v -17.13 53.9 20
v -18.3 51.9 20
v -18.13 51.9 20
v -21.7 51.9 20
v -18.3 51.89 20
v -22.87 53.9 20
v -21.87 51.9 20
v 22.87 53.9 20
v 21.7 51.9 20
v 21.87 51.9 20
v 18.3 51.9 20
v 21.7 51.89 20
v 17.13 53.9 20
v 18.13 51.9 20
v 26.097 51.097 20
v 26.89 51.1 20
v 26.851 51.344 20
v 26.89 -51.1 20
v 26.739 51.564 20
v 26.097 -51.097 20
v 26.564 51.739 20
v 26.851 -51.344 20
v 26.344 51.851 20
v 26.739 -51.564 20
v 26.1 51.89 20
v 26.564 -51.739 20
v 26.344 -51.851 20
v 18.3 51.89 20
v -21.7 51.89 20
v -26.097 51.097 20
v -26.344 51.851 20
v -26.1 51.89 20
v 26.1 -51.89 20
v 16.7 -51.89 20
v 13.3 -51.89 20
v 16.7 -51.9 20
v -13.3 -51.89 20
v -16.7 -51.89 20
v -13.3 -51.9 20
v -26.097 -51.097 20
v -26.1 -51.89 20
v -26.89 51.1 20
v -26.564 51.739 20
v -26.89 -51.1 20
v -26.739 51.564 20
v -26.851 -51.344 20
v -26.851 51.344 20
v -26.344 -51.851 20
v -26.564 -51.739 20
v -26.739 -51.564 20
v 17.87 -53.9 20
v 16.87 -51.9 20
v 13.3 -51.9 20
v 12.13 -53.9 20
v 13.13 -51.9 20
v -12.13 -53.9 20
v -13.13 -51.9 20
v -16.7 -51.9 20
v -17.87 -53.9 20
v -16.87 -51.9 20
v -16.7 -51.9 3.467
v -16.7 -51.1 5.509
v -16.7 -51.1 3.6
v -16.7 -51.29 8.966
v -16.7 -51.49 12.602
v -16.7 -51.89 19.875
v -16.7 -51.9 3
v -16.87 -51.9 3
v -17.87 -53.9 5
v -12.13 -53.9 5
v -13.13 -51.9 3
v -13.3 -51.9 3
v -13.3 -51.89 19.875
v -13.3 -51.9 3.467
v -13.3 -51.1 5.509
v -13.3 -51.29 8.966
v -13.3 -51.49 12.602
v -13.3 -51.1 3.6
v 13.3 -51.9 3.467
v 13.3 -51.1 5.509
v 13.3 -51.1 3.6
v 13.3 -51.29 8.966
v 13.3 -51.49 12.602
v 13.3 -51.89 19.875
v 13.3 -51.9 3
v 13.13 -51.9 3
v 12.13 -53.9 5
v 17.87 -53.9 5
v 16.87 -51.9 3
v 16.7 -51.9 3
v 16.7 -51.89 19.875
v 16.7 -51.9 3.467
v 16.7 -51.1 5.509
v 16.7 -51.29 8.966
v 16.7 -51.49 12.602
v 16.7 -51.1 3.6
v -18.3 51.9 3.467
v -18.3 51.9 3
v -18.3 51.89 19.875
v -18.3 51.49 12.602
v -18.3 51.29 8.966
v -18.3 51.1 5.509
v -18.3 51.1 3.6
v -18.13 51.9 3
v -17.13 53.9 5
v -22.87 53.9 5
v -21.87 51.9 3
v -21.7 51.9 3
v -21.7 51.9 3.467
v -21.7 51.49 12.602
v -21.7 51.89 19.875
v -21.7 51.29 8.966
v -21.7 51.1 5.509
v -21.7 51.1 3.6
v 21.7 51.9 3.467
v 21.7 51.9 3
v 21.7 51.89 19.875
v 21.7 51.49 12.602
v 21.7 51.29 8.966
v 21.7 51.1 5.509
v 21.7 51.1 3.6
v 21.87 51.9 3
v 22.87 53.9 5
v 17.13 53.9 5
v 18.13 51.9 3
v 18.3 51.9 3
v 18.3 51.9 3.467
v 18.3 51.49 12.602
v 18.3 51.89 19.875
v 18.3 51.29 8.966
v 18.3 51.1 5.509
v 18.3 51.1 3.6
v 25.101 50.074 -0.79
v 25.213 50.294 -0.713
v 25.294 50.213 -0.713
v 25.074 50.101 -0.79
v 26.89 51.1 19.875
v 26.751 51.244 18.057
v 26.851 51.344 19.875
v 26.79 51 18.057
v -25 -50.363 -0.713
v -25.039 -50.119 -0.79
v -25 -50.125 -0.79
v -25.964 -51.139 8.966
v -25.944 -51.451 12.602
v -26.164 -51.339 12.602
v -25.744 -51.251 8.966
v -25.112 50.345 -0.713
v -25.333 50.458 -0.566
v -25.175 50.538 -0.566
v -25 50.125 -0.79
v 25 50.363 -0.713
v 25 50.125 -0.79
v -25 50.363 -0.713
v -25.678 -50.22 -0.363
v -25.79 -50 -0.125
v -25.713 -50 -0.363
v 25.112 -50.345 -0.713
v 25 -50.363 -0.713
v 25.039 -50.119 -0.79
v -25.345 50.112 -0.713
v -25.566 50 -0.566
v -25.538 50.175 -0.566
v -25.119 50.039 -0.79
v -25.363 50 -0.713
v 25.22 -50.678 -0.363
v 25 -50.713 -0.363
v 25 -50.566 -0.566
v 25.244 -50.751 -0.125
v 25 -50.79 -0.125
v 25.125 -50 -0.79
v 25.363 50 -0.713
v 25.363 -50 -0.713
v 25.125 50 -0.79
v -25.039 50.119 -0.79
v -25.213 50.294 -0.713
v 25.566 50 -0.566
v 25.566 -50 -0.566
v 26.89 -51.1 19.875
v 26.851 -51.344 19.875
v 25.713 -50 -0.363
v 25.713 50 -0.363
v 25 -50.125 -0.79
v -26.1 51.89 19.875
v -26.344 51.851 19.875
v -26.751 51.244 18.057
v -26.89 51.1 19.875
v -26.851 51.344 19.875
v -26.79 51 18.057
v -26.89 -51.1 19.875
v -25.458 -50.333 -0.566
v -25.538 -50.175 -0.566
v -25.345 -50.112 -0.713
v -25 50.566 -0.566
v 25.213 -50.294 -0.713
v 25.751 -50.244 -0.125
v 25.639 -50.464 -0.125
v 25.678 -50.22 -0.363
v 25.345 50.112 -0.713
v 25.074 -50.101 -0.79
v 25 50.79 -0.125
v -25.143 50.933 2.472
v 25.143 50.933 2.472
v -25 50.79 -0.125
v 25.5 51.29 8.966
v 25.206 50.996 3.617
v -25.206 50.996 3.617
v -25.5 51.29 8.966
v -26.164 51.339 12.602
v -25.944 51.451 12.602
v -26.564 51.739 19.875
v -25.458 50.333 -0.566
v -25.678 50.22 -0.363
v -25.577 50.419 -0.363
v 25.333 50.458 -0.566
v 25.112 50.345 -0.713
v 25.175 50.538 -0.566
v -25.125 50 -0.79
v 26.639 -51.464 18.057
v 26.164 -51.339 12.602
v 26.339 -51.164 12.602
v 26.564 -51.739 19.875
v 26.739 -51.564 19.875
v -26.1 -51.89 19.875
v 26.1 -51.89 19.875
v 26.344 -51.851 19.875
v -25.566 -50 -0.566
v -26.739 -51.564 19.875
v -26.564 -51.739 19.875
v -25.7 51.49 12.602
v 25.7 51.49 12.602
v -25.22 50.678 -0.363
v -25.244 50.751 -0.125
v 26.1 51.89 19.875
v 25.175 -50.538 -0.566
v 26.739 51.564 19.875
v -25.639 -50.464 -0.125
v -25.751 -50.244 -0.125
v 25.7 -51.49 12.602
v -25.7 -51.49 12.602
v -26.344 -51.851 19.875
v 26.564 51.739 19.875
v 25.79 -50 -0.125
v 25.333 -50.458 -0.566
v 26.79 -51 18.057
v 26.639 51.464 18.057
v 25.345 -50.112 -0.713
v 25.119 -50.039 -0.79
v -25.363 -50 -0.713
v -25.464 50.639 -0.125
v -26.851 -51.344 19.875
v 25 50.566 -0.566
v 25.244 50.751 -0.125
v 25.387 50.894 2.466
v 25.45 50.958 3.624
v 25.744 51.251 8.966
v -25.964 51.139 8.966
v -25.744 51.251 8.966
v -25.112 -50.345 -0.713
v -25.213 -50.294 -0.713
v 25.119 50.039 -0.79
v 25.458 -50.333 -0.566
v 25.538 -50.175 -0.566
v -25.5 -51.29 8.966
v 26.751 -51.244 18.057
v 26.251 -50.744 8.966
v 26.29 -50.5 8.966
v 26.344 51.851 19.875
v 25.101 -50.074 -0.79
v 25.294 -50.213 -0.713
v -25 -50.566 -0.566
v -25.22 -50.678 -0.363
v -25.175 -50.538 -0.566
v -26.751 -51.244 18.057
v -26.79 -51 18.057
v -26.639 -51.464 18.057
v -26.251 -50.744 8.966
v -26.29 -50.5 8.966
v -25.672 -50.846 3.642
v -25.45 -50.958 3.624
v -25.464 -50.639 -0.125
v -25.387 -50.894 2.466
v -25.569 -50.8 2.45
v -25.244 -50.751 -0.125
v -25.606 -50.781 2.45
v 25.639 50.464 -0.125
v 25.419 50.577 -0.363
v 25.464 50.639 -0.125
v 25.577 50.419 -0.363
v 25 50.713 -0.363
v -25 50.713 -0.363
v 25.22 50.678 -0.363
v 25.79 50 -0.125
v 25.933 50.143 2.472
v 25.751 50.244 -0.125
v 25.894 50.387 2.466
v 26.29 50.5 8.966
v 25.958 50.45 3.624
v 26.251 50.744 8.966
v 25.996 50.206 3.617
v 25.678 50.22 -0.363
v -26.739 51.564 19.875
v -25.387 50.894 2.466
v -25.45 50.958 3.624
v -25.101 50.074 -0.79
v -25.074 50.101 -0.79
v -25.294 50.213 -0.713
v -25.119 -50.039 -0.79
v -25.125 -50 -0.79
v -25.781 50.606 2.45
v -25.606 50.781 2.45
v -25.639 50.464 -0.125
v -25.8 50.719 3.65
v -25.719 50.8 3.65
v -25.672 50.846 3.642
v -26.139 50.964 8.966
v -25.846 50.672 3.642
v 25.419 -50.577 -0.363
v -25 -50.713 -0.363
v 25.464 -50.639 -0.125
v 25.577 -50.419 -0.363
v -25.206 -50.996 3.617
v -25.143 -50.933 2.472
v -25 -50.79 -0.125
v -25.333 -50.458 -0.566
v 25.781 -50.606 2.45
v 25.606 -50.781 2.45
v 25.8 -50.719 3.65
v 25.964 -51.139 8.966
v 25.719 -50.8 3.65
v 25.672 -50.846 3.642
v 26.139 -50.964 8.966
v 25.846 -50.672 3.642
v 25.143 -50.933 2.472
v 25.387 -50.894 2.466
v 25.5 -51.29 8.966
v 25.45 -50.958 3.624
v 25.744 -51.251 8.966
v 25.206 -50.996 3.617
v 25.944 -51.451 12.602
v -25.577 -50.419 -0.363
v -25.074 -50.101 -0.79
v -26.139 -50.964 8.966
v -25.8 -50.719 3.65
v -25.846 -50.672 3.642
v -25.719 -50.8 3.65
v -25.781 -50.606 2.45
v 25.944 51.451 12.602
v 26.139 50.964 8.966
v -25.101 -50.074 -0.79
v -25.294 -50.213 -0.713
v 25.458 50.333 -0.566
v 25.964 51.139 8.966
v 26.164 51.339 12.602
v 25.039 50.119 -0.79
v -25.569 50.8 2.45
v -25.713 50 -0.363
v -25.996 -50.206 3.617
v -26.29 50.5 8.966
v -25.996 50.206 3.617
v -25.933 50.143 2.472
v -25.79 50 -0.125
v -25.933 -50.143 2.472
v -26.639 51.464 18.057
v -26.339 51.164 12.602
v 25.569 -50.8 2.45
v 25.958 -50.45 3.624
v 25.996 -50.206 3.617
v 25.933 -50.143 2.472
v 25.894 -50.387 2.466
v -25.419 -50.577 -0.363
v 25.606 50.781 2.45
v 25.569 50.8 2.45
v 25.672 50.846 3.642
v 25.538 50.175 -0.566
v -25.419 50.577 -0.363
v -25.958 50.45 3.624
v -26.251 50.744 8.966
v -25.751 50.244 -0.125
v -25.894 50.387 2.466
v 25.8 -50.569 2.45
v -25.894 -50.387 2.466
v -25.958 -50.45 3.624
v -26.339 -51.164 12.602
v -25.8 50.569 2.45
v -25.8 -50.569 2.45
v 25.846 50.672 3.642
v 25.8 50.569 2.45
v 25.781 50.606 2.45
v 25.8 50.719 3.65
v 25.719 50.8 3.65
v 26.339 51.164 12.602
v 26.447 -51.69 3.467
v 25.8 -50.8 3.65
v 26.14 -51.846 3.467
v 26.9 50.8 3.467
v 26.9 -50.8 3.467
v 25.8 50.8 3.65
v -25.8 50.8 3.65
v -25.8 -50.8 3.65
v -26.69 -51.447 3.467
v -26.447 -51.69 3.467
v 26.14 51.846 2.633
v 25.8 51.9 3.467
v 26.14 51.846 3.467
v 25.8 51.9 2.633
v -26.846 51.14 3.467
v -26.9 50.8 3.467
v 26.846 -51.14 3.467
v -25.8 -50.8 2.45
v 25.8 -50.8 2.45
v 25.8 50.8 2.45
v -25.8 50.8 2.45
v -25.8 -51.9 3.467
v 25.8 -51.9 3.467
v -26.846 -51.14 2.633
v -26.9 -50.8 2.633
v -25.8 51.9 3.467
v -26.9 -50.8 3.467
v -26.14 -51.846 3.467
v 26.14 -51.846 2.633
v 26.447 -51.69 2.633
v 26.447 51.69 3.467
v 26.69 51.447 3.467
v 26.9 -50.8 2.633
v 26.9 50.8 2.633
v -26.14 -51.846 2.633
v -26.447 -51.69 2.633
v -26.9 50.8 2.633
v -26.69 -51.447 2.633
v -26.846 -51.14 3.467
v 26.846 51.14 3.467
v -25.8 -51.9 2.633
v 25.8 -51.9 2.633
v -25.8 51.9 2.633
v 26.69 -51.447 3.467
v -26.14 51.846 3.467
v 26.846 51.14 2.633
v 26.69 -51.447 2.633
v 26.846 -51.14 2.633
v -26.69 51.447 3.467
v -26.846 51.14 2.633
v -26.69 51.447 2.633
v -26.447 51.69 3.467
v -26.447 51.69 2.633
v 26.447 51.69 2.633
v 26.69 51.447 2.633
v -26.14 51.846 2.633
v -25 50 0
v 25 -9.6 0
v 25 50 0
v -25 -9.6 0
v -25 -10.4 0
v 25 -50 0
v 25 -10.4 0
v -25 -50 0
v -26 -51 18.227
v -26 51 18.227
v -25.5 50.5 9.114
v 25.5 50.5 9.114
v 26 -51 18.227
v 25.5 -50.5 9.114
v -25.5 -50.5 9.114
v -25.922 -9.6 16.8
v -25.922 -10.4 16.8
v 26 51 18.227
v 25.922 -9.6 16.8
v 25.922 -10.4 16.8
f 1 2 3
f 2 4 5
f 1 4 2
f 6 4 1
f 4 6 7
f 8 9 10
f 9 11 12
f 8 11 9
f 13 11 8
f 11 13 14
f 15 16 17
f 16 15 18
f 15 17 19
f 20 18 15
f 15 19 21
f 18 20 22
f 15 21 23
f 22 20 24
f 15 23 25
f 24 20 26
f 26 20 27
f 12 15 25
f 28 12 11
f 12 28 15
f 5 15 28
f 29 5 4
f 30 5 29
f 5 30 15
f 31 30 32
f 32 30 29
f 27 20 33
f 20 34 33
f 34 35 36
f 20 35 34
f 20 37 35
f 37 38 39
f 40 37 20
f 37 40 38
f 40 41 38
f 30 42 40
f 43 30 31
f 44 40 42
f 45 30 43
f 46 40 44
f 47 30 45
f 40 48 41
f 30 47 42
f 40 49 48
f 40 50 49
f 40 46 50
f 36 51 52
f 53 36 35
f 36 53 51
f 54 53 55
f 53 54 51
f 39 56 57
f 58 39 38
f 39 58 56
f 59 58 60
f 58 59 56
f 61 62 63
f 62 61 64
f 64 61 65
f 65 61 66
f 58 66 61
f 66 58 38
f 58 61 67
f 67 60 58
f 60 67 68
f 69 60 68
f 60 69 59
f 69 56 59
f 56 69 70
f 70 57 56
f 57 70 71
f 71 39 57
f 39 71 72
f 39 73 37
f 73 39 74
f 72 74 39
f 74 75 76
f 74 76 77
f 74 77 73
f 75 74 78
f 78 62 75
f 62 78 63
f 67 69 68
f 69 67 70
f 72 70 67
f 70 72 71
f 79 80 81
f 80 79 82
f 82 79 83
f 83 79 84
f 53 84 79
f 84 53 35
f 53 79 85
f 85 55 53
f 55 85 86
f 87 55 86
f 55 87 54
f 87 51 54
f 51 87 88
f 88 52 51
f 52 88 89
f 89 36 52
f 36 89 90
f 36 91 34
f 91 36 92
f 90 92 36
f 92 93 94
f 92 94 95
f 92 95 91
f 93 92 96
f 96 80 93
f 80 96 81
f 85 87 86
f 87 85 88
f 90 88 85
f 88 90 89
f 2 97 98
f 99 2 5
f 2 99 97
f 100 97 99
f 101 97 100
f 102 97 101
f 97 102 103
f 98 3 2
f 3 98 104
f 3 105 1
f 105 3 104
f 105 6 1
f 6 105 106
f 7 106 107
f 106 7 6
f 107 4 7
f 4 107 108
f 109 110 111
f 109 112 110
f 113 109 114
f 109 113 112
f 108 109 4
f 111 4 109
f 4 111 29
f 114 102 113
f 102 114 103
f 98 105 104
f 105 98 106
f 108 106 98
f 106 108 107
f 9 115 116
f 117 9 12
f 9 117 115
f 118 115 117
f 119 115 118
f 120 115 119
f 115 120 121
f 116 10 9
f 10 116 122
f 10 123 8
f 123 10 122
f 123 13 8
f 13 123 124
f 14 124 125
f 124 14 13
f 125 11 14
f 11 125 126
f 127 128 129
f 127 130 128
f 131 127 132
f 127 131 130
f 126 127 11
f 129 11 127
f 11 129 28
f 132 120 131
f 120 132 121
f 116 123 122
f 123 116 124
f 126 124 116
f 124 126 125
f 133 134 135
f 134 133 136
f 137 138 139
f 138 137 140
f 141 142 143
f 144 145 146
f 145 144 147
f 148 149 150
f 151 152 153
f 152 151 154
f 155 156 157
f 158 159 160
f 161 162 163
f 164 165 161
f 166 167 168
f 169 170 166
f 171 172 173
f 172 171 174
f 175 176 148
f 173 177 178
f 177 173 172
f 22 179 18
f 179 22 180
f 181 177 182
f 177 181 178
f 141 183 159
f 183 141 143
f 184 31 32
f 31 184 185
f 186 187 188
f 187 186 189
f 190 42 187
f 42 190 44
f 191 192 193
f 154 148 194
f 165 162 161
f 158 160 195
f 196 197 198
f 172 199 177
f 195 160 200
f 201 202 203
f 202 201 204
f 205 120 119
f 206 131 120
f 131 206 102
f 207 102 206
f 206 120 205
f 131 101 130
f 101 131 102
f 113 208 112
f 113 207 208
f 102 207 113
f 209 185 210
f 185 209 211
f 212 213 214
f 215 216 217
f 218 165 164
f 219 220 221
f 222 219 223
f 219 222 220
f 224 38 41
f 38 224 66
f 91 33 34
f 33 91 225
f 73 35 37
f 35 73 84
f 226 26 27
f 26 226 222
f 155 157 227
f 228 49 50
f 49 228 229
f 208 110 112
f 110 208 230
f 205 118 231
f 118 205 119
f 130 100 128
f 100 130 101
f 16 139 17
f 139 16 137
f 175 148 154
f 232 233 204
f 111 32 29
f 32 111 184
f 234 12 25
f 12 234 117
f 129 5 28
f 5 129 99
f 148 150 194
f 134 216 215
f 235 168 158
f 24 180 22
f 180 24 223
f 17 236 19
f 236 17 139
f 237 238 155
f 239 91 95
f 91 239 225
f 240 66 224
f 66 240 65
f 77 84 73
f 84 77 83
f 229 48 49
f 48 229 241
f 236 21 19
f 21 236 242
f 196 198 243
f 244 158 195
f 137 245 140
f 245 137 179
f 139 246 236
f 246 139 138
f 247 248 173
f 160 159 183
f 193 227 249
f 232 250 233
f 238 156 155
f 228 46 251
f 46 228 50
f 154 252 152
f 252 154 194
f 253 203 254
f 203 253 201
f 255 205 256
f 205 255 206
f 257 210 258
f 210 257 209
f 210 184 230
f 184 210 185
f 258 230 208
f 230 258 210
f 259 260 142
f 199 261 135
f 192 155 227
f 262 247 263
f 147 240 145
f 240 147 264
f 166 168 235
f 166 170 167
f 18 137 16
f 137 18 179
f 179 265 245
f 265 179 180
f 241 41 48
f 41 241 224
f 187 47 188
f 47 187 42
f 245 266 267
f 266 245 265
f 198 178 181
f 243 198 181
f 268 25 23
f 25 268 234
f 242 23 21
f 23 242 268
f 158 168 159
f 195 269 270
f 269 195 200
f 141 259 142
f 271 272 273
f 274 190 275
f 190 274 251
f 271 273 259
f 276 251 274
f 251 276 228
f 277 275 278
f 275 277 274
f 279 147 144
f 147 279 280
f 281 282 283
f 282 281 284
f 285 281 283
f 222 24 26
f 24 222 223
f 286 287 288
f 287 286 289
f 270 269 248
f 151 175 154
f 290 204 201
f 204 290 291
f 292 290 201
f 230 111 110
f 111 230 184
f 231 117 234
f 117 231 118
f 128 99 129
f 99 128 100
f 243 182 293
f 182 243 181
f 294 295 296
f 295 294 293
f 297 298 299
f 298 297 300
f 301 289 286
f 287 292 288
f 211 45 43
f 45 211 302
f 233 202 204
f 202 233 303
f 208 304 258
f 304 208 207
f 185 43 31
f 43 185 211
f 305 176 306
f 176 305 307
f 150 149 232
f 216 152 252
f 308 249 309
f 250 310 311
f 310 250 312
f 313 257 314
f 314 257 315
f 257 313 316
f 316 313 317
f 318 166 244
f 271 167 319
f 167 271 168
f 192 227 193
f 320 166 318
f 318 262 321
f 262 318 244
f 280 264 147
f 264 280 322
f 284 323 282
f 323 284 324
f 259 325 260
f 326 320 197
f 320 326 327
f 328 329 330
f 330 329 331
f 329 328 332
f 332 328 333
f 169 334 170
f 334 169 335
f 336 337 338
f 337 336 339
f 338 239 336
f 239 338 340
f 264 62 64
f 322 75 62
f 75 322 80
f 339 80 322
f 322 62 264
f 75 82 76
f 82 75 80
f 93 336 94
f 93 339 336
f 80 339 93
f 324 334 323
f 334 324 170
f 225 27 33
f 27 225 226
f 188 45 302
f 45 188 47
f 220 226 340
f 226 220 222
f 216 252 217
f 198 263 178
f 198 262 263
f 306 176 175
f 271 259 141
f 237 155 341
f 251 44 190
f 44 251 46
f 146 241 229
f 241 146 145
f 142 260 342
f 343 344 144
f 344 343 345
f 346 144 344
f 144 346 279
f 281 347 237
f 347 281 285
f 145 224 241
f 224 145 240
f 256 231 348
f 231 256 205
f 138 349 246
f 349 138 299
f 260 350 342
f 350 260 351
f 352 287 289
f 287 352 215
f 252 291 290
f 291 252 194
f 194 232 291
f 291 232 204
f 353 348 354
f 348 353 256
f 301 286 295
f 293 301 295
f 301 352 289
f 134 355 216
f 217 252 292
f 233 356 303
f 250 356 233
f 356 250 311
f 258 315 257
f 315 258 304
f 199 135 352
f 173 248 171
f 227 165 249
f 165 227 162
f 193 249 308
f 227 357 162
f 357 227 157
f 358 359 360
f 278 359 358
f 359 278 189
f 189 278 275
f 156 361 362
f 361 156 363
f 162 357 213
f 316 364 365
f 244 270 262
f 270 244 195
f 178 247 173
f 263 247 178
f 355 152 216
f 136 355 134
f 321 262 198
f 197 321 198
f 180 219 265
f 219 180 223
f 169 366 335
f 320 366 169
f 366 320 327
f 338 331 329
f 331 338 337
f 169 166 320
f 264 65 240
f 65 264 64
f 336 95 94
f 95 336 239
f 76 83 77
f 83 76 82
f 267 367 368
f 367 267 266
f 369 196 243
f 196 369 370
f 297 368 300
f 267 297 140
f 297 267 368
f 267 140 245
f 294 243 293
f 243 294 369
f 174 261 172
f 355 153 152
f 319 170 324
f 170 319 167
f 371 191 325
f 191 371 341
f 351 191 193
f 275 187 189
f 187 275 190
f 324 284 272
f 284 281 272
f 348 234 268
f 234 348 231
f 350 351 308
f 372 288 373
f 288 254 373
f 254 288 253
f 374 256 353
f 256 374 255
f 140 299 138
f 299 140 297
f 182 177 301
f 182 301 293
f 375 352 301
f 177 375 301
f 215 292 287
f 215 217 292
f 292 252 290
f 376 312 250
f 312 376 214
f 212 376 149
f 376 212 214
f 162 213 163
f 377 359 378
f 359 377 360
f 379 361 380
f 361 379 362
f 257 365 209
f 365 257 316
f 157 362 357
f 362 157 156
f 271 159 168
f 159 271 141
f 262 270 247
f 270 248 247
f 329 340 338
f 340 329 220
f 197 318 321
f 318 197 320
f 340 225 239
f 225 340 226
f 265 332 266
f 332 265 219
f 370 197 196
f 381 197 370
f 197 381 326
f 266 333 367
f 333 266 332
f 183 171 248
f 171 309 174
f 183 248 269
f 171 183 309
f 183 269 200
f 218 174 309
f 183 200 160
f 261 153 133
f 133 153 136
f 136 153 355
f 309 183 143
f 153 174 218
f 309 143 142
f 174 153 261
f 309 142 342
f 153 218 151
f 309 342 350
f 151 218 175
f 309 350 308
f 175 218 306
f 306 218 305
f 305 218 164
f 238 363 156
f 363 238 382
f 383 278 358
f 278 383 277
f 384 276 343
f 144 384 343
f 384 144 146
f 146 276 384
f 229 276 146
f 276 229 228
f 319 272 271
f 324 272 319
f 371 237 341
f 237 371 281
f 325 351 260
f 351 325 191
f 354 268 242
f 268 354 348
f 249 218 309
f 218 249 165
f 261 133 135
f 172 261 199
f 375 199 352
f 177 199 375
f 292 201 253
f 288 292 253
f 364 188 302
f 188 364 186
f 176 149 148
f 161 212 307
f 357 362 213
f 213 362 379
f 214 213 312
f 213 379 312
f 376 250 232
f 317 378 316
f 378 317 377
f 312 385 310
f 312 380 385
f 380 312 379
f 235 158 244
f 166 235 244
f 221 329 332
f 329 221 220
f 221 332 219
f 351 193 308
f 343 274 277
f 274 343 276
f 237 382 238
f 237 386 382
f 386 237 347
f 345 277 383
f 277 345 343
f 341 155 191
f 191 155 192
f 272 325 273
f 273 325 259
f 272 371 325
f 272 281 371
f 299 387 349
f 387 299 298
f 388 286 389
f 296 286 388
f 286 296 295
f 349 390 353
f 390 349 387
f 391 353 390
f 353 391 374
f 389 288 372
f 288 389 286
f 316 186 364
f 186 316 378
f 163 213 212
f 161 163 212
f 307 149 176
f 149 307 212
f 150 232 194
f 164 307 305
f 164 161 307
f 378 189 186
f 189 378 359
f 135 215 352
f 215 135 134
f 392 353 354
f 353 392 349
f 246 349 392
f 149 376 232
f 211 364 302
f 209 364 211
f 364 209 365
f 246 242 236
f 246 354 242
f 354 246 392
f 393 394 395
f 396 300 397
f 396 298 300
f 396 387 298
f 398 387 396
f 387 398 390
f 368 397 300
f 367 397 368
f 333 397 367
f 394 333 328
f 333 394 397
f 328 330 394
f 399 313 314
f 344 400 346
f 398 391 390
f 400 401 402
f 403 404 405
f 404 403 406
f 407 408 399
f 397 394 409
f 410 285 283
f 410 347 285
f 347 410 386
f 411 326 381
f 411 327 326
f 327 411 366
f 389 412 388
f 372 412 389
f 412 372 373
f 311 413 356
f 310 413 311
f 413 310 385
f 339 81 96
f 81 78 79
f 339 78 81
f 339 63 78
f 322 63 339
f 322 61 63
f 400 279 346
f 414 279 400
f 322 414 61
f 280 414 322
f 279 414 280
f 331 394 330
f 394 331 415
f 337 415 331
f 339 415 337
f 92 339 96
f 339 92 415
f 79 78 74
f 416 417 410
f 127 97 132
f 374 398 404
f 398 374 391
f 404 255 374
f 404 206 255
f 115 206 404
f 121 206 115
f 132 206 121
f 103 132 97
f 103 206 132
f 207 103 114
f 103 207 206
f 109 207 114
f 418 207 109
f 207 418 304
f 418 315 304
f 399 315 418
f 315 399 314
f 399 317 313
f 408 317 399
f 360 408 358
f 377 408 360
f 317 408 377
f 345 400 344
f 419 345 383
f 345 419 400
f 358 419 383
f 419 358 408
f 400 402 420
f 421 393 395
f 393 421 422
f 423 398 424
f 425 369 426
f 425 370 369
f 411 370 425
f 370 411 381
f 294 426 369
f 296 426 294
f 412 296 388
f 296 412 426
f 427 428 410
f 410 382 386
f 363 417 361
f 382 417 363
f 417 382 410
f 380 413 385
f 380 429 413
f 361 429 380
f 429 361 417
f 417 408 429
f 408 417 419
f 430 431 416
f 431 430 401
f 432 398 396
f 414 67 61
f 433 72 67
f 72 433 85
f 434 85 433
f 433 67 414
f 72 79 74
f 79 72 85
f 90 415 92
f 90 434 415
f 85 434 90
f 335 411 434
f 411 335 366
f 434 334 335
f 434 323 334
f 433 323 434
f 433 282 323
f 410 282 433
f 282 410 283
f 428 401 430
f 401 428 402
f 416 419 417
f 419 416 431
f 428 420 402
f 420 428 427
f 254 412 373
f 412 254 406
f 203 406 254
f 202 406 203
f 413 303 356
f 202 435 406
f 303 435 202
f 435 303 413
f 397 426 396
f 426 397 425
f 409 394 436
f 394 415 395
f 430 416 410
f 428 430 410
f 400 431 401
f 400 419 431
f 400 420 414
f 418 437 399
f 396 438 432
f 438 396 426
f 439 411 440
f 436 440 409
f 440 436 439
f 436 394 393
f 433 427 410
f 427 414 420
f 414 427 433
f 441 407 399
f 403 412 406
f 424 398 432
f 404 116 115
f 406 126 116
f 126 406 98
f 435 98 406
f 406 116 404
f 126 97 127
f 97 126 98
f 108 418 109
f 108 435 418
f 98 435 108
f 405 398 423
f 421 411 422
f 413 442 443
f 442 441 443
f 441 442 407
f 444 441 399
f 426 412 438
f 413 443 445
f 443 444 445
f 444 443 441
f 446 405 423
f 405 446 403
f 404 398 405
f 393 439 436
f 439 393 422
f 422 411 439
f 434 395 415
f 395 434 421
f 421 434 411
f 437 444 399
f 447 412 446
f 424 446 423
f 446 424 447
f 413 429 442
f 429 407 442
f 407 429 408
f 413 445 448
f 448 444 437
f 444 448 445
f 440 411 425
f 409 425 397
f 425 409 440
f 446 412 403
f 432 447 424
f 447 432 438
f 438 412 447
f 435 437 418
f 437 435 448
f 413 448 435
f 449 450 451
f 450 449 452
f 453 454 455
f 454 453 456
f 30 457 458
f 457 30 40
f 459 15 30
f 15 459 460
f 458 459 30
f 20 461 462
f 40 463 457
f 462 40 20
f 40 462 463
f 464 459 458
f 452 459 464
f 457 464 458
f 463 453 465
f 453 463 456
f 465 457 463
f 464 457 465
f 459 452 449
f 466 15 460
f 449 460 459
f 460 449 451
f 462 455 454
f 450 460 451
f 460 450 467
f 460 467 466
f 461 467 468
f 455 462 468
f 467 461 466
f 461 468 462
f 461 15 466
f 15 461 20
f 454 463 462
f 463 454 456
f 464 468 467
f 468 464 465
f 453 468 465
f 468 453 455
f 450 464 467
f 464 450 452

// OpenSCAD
// some simple but versatile thin-walled storage boxes
//
//
// Background:
//   - CAD manual: http://www.openscad.org/documentation.html
//   - possibility to attach to parts from raspi_RJ45fix.scad
//
// Andreas Merz 2019-01-12, v0.8 
// GPLv3 or later, see http://www.gnu.org/licenses





//-------------------------------
// dovetail
//
//       w2
//    ---------
//    \       /  h
//     ---+---
//       w1
//-------------------------------

module schwalbenschwanz(h=2, w1=4, w2=6) {
             //w1=(w2-h*tan(30));      // Flankenwinkel 30 deg
             c=0.13;   // clearance / spiel in mm
             polygon(points=[[-w1/2+c,0],[w1/2-c,0],[w2/2-c,h],[-w2/2+c,h]]);
}

module dovetail3D(h=20, s=45, t=0.8) {
         c=0.3;   // clearance / spiel in mm
         difference() { 
           linear_extrude(height=h)
              union() {
                schwalbenschwanz();
                translate([-2+c,-t]) square([4-2*c,t]);

              }
           rotate([s,0,0]) translate([-4,0,-4]) cube([8, 4, 4]);
         }
 }


// Werkzeuge, um Fasen mit minkowsky() herzustellen

module pyramid(h=1) {
    linear_extrude(height=h, scale=0) rotate([0,0,45]) square(sqrt(2)*h,center=true);
}

module octaeder(r=1) {
  union() {
    pyramid(h=r);
    rotate([180,0,0]) pyramid(h=r);
  }
}

module halfsphere(r=1) {
  intersection() { 
    sphere(r, $fn=20); 
    translate([-2,-2,0]*r) cube(4*r);
  }
}


module trapezrot(r=1) {
   rotate_extrude($fn=20)
      polygon([[0,r/2],[r,r/3],[r,-r/3],[0,-r/2]]);
}

// add-on to avoid warping
module mouseear4(xm=50, ym=100, hm=0.45) {
  rm=9;
  linear_extrude(height=hm)
    union() {
      translate([0,  0]) circle(r=rm);
      translate([xm, 0]) circle(r=rm);
      translate([0, ym]) circle(r=rm);
      translate([xm,ym]) circle(r=rm);
    }
}


//------------------------
// simple brick-shaped box
//------------------------
module am_boxA(x=50, y=100, z=20) {
  // x,y,z: inner dimensions
  w=0.8;    // wall thickness
  union() {
    difference() {
      minkowski() {        // outer contour, chamfered
        cube([x,y,z]);
        rotate([180,0,0]) pyramid(h=w);
      }
      cube([x,y,z+w]);
    }
  }
}

//------------------------
// stackable box
//------------------------
module am_boxB(x=50, y=100, z=20) {
  // x,y,z: inner dimensions
  w=0.8;         // wall thickness
  c=0.6;         // clearance
  sx=(x+2*w+c)/x;  // slope factor x
  sy=(y+2*w+c)/y;  // slope factor y
  union() {
    difference() {
      union() {
        minkowski() {                    // outer contour, chamfered
          linear_extrude(height=z, scale=[sx,sy]) square([x,y],center=true);
          rotate([180,0,0]) halfsphere(r=w);
        }
        translate([0,0,3])               // stacking rim
          minkowski() { 
            linear_extrude(height=0.1) 
              square([x+2*w,y+2*w],center=true);
            trapezrot(r=w+c/2);
          }
      }
      linear_extrude(height=z+0.05, scale=[sx,sy]) square([x,y],center=true); // inner box
    }
  }
}

//-----------------------------------------------------------
// stackable box with dove tail connection / label holder
//-----------------------------------------------------------
module am_boxC(x=50, y=100, z=20) {
  // x,y,z: inner dimensions
  w=0.8;         // wall thickness
  c=0.6;         // clearance
  sx=(x+2*w+c)/x;  // slope factor x
  sy=(y+2*w+c)/y;  // slope factor y
  union() {
    difference() {
      union() {
        minkowski() {                    // outer contour, chamfered
          linear_extrude(height=z, scale=[sx,sy]) square([x,y],center=true);
          rotate([180,0,0]) halfsphere(r=w);
        }
        translate([0,0,3])               // stacking rim
          minkowski() { 
            linear_extrude(height=0.1) 
              square([x+2*w,y+2*w],center=true);
            trapezrot(r=w+c/2);
          }
        
        // dovetail connector
        translate([-2*10+5,-(y/2+2*w+c/2),3]) rotate(180) dovetail3D(h=z-3);
        translate([+2*10-5,-(y/2+2*w+c/2),3]) rotate(180) dovetail3D(h=z-3);
        translate([-2*10+0, (y/2+2*w+c/2),3]) rotate(  0) dovetail3D(h=z-3);
        translate([+2*10-0, (y/2+2*w+c/2),3]) rotate(  0) dovetail3D(h=z-3);
      }
      linear_extrude(height=z+0.05, scale=[sx,sy]) square([x,y],center=true); // inner box
    }
  }
}

//---------------------------------
// box with separator wall 
//---------------------------------
module am_boxWall(x=50, y=40, z=20) {
  w=0.8;         // wall thickness
  c=0.6;         // clearance
  t=3.2;         // clearance on top of wall
  sx=(x+2*w*(z-t)/z+c)/x;  // slope factor x
         linear_extrude(height=z-t,scale=[sx,1]) 
           square([x+w,w],center=true);
}

module am_boxD(x=50, y=100, z=20) {
  yratio=0.6;  // size ratio of separation
  union() {
    am_boxC(x=x, y=y, z=z);
    translate([0,y*(0.5 - yratio),0]) am_boxWall(x=x, y=y, z=z);
  }
}


//---------------------------------
// label to fit between dovetail 
//---------------------------------
// for symbols, consider png23d
//
module am_boxlabelA( txt="1", lx=25, ly=15, align=2/3 ) {
  // lx:    label width, actually it will be 1 mm more to fit between dovetails
  // ly:    label heigth
  w=0.8;               // thickness
  fontname = "Liberation Sans";
  fontsize = 5;
  c=0.3;               // clearance - negative: make tighter
  s=1-w/(2*(lx+1-c));  // scale factor
  union() {
    translate([(lx+1-c)/2,ly/2,0]) linear_extrude(height = w, scale=[s,1]) 
      square([lx+1-c,ly],center=true);
    color("red")
    translate([lx/2,ly*align,w]) linear_extrude(height = 0.4) 
      text(txt, size = fontsize, font = fontname, halign = "center", valign = "center", $fn = 16);
  }
}

module am_boxlabel( txt="1", lx=25, ly=15, align=1/2, fontname = "FreeSans:Bold" ) {
  // lx:    mean label width
  w=0.8;               // thickness
  //fontname = "Liberation Sans";
  fontsize = 7;
  c=0.3;               // clearance
  difference() {
    union() {
      translate([0,0,0]) linear_extrude(height = w) 
        square([lx+2,ly]);
      color("red")
      translate([(lx+0.5)/2,ly*align,w]) linear_extrude(height = 0.4) 
        text(txt, size = fontsize, font = fontname, halign = "center", valign = "center", $fn = 40);
    }

    union() {
        translate([-5/2+0.8+c,-1,0.75]) rotate([92.5,0,180]) dovetail3D(h=ly+2);
        translate([lx+5-5/2,  -1,0.75]) rotate([92.5,0,180]) dovetail3D(h=ly+2);
    }
  }
}


module am_gauge( fontname = "FreeSans:Bold" ) {
  w=0.8;               // thickness
  //fontname = "Liberation Sans";
  fontsize = 4;
  c=0.3;               // clearance
  n=7;                 // step length
    union() {
      translate([0,0,0]) linear_extrude(height = w) 
        difference() {
          translate([-15,-5,0]) square([20,80]);
          polygon([ [-1.5,10*n],[-1.5,9*n],
                    [-2.0,9*n],[-2.0,8*n],
                    [-2.5,8*n],[-2.5,7*n],
                    [-3.0,7*n],[-3.0,6*n],
                    [-3.5,6*n],[-3.5,5*n],
                    [-4.0,5*n],[-4.0,4*n],
                    [-4.5,4*n],[-4.5,3*n],
                    [-5.0,3*n],[-5.0,2*n],
                    [-5.5,2*n],[-5.5,1*n],
                    [-6.0,1*n],[-6.0,0*n],
                    [c, 0],    [c,10*n] ]);
      }
      color("red")
      translate([0,3,w]) linear_extrude(height = 0.4) 
      union() {
        translate([-14,9*n]) text("1.5", size = fontsize, font = fontname, halign = "left", valign = "center", $fn = 32);
        translate([-14,8*n]) text("2  ", size = fontsize, font = fontname, halign = "left", valign = "center", $fn = 32);
        translate([-14,7*n]) text("2.5", size = fontsize, font = fontname, halign = "left", valign = "center", $fn = 32);
        translate([-14,6*n]) text("3  ", size = fontsize, font = fontname, halign = "left", valign = "center", $fn = 32);
        translate([-14,5*n]) text("3.5", size = fontsize, font = fontname, halign = "left", valign = "center", $fn = 32);
        translate([-14,4*n]) text("4  ", size = fontsize, font = fontname, halign = "left", valign = "center", $fn = 32);
        translate([-14,3*n]) text("4.5", size = fontsize, font = fontname, halign = "left", valign = "center", $fn = 32);
        translate([-14,2*n]) text("5  ", size = fontsize, font = fontname, halign = "left", valign = "center", $fn = 32);
        translate([-14,1*n]) text("5.5", size = fontsize, font = fontname, halign = "left", valign = "center", $fn = 32);
        translate([-14,0*n]) text("6  ", size = fontsize, font = fontname, halign = "left", valign = "center", $fn = 32);
      }
    }

}


//---------------- Instances ---------------------

//octaeder(r=10);
//trapezrot(r=10);

translate([0,0,0]) am_boxD();
//translate([0,106,0]) am_boxC();
//translate([0,106,0]) am_boxC(z=20);  // double height

/*
if ( 0 ) {
  // do not forget to change color in slicer before the text layers
  translate([0, 2*17,0]) am_boxlabel(lx=35,txt="Baubles");
  translate([0, 1*17,0]) am_boxlabel(lx=35,txt="Bangles");
  translate([0, 0*17,0]) am_boxlabel(      txt="Beads");
  translate([0,-1*17,0]) am_boxlabel(      txt="Rings");
}
if ( 1 ) {
  // do not forget to change color in slicer before the text layers
  translate([0, 3*17,0]) am_boxlabel(txt="M 8");
  translate([0, 2*17,0]) am_boxlabel(txt="M 6");
  translate([0, 1*17,0]) am_boxlabel(txt="M 5");
  translate([0, 0*17,0]) am_boxlabel(txt="M 4");
  translate([0,-1*17,0]) am_boxlabel(txt="M 3");
  translate([0,-2*17,0]) am_boxlabel(txt="M 2.5");
  translate([0,-3*17,0]) am_boxlabel(txt="M 2");

  translate([27, 3*17,0]) am_boxlabel(txt="\u2300 8", fontname="FreeSans:style=Mittel");
  translate([27, 2*17,0]) am_boxlabel(txt="\u2300 6", fontname="FreeSans:style=Mittel");
  translate([27, 1*17,0]) am_boxlabel(txt="\u2300 5", fontname="FreeSans:style=Mittel");
  translate([27, 0*17,0]) am_boxlabel(txt="\u2300 4", fontname="FreeSans:style=Mittel");
  translate([27,-1*17,0]) am_boxlabel(txt="\u2300 3", fontname="FreeSans:style=Mittel");
  translate([27,-2*17,0]) am_boxlabel(txt="\u2300 2.5", fontname="FreeSans:style=Mittel");
  translate([27,-3*17,0]) am_boxlabel(txt="\u2300 2", fontname="FreeSans:style=Mittel");
}

translate([-7,-9,0]) am_gauge();
*/
